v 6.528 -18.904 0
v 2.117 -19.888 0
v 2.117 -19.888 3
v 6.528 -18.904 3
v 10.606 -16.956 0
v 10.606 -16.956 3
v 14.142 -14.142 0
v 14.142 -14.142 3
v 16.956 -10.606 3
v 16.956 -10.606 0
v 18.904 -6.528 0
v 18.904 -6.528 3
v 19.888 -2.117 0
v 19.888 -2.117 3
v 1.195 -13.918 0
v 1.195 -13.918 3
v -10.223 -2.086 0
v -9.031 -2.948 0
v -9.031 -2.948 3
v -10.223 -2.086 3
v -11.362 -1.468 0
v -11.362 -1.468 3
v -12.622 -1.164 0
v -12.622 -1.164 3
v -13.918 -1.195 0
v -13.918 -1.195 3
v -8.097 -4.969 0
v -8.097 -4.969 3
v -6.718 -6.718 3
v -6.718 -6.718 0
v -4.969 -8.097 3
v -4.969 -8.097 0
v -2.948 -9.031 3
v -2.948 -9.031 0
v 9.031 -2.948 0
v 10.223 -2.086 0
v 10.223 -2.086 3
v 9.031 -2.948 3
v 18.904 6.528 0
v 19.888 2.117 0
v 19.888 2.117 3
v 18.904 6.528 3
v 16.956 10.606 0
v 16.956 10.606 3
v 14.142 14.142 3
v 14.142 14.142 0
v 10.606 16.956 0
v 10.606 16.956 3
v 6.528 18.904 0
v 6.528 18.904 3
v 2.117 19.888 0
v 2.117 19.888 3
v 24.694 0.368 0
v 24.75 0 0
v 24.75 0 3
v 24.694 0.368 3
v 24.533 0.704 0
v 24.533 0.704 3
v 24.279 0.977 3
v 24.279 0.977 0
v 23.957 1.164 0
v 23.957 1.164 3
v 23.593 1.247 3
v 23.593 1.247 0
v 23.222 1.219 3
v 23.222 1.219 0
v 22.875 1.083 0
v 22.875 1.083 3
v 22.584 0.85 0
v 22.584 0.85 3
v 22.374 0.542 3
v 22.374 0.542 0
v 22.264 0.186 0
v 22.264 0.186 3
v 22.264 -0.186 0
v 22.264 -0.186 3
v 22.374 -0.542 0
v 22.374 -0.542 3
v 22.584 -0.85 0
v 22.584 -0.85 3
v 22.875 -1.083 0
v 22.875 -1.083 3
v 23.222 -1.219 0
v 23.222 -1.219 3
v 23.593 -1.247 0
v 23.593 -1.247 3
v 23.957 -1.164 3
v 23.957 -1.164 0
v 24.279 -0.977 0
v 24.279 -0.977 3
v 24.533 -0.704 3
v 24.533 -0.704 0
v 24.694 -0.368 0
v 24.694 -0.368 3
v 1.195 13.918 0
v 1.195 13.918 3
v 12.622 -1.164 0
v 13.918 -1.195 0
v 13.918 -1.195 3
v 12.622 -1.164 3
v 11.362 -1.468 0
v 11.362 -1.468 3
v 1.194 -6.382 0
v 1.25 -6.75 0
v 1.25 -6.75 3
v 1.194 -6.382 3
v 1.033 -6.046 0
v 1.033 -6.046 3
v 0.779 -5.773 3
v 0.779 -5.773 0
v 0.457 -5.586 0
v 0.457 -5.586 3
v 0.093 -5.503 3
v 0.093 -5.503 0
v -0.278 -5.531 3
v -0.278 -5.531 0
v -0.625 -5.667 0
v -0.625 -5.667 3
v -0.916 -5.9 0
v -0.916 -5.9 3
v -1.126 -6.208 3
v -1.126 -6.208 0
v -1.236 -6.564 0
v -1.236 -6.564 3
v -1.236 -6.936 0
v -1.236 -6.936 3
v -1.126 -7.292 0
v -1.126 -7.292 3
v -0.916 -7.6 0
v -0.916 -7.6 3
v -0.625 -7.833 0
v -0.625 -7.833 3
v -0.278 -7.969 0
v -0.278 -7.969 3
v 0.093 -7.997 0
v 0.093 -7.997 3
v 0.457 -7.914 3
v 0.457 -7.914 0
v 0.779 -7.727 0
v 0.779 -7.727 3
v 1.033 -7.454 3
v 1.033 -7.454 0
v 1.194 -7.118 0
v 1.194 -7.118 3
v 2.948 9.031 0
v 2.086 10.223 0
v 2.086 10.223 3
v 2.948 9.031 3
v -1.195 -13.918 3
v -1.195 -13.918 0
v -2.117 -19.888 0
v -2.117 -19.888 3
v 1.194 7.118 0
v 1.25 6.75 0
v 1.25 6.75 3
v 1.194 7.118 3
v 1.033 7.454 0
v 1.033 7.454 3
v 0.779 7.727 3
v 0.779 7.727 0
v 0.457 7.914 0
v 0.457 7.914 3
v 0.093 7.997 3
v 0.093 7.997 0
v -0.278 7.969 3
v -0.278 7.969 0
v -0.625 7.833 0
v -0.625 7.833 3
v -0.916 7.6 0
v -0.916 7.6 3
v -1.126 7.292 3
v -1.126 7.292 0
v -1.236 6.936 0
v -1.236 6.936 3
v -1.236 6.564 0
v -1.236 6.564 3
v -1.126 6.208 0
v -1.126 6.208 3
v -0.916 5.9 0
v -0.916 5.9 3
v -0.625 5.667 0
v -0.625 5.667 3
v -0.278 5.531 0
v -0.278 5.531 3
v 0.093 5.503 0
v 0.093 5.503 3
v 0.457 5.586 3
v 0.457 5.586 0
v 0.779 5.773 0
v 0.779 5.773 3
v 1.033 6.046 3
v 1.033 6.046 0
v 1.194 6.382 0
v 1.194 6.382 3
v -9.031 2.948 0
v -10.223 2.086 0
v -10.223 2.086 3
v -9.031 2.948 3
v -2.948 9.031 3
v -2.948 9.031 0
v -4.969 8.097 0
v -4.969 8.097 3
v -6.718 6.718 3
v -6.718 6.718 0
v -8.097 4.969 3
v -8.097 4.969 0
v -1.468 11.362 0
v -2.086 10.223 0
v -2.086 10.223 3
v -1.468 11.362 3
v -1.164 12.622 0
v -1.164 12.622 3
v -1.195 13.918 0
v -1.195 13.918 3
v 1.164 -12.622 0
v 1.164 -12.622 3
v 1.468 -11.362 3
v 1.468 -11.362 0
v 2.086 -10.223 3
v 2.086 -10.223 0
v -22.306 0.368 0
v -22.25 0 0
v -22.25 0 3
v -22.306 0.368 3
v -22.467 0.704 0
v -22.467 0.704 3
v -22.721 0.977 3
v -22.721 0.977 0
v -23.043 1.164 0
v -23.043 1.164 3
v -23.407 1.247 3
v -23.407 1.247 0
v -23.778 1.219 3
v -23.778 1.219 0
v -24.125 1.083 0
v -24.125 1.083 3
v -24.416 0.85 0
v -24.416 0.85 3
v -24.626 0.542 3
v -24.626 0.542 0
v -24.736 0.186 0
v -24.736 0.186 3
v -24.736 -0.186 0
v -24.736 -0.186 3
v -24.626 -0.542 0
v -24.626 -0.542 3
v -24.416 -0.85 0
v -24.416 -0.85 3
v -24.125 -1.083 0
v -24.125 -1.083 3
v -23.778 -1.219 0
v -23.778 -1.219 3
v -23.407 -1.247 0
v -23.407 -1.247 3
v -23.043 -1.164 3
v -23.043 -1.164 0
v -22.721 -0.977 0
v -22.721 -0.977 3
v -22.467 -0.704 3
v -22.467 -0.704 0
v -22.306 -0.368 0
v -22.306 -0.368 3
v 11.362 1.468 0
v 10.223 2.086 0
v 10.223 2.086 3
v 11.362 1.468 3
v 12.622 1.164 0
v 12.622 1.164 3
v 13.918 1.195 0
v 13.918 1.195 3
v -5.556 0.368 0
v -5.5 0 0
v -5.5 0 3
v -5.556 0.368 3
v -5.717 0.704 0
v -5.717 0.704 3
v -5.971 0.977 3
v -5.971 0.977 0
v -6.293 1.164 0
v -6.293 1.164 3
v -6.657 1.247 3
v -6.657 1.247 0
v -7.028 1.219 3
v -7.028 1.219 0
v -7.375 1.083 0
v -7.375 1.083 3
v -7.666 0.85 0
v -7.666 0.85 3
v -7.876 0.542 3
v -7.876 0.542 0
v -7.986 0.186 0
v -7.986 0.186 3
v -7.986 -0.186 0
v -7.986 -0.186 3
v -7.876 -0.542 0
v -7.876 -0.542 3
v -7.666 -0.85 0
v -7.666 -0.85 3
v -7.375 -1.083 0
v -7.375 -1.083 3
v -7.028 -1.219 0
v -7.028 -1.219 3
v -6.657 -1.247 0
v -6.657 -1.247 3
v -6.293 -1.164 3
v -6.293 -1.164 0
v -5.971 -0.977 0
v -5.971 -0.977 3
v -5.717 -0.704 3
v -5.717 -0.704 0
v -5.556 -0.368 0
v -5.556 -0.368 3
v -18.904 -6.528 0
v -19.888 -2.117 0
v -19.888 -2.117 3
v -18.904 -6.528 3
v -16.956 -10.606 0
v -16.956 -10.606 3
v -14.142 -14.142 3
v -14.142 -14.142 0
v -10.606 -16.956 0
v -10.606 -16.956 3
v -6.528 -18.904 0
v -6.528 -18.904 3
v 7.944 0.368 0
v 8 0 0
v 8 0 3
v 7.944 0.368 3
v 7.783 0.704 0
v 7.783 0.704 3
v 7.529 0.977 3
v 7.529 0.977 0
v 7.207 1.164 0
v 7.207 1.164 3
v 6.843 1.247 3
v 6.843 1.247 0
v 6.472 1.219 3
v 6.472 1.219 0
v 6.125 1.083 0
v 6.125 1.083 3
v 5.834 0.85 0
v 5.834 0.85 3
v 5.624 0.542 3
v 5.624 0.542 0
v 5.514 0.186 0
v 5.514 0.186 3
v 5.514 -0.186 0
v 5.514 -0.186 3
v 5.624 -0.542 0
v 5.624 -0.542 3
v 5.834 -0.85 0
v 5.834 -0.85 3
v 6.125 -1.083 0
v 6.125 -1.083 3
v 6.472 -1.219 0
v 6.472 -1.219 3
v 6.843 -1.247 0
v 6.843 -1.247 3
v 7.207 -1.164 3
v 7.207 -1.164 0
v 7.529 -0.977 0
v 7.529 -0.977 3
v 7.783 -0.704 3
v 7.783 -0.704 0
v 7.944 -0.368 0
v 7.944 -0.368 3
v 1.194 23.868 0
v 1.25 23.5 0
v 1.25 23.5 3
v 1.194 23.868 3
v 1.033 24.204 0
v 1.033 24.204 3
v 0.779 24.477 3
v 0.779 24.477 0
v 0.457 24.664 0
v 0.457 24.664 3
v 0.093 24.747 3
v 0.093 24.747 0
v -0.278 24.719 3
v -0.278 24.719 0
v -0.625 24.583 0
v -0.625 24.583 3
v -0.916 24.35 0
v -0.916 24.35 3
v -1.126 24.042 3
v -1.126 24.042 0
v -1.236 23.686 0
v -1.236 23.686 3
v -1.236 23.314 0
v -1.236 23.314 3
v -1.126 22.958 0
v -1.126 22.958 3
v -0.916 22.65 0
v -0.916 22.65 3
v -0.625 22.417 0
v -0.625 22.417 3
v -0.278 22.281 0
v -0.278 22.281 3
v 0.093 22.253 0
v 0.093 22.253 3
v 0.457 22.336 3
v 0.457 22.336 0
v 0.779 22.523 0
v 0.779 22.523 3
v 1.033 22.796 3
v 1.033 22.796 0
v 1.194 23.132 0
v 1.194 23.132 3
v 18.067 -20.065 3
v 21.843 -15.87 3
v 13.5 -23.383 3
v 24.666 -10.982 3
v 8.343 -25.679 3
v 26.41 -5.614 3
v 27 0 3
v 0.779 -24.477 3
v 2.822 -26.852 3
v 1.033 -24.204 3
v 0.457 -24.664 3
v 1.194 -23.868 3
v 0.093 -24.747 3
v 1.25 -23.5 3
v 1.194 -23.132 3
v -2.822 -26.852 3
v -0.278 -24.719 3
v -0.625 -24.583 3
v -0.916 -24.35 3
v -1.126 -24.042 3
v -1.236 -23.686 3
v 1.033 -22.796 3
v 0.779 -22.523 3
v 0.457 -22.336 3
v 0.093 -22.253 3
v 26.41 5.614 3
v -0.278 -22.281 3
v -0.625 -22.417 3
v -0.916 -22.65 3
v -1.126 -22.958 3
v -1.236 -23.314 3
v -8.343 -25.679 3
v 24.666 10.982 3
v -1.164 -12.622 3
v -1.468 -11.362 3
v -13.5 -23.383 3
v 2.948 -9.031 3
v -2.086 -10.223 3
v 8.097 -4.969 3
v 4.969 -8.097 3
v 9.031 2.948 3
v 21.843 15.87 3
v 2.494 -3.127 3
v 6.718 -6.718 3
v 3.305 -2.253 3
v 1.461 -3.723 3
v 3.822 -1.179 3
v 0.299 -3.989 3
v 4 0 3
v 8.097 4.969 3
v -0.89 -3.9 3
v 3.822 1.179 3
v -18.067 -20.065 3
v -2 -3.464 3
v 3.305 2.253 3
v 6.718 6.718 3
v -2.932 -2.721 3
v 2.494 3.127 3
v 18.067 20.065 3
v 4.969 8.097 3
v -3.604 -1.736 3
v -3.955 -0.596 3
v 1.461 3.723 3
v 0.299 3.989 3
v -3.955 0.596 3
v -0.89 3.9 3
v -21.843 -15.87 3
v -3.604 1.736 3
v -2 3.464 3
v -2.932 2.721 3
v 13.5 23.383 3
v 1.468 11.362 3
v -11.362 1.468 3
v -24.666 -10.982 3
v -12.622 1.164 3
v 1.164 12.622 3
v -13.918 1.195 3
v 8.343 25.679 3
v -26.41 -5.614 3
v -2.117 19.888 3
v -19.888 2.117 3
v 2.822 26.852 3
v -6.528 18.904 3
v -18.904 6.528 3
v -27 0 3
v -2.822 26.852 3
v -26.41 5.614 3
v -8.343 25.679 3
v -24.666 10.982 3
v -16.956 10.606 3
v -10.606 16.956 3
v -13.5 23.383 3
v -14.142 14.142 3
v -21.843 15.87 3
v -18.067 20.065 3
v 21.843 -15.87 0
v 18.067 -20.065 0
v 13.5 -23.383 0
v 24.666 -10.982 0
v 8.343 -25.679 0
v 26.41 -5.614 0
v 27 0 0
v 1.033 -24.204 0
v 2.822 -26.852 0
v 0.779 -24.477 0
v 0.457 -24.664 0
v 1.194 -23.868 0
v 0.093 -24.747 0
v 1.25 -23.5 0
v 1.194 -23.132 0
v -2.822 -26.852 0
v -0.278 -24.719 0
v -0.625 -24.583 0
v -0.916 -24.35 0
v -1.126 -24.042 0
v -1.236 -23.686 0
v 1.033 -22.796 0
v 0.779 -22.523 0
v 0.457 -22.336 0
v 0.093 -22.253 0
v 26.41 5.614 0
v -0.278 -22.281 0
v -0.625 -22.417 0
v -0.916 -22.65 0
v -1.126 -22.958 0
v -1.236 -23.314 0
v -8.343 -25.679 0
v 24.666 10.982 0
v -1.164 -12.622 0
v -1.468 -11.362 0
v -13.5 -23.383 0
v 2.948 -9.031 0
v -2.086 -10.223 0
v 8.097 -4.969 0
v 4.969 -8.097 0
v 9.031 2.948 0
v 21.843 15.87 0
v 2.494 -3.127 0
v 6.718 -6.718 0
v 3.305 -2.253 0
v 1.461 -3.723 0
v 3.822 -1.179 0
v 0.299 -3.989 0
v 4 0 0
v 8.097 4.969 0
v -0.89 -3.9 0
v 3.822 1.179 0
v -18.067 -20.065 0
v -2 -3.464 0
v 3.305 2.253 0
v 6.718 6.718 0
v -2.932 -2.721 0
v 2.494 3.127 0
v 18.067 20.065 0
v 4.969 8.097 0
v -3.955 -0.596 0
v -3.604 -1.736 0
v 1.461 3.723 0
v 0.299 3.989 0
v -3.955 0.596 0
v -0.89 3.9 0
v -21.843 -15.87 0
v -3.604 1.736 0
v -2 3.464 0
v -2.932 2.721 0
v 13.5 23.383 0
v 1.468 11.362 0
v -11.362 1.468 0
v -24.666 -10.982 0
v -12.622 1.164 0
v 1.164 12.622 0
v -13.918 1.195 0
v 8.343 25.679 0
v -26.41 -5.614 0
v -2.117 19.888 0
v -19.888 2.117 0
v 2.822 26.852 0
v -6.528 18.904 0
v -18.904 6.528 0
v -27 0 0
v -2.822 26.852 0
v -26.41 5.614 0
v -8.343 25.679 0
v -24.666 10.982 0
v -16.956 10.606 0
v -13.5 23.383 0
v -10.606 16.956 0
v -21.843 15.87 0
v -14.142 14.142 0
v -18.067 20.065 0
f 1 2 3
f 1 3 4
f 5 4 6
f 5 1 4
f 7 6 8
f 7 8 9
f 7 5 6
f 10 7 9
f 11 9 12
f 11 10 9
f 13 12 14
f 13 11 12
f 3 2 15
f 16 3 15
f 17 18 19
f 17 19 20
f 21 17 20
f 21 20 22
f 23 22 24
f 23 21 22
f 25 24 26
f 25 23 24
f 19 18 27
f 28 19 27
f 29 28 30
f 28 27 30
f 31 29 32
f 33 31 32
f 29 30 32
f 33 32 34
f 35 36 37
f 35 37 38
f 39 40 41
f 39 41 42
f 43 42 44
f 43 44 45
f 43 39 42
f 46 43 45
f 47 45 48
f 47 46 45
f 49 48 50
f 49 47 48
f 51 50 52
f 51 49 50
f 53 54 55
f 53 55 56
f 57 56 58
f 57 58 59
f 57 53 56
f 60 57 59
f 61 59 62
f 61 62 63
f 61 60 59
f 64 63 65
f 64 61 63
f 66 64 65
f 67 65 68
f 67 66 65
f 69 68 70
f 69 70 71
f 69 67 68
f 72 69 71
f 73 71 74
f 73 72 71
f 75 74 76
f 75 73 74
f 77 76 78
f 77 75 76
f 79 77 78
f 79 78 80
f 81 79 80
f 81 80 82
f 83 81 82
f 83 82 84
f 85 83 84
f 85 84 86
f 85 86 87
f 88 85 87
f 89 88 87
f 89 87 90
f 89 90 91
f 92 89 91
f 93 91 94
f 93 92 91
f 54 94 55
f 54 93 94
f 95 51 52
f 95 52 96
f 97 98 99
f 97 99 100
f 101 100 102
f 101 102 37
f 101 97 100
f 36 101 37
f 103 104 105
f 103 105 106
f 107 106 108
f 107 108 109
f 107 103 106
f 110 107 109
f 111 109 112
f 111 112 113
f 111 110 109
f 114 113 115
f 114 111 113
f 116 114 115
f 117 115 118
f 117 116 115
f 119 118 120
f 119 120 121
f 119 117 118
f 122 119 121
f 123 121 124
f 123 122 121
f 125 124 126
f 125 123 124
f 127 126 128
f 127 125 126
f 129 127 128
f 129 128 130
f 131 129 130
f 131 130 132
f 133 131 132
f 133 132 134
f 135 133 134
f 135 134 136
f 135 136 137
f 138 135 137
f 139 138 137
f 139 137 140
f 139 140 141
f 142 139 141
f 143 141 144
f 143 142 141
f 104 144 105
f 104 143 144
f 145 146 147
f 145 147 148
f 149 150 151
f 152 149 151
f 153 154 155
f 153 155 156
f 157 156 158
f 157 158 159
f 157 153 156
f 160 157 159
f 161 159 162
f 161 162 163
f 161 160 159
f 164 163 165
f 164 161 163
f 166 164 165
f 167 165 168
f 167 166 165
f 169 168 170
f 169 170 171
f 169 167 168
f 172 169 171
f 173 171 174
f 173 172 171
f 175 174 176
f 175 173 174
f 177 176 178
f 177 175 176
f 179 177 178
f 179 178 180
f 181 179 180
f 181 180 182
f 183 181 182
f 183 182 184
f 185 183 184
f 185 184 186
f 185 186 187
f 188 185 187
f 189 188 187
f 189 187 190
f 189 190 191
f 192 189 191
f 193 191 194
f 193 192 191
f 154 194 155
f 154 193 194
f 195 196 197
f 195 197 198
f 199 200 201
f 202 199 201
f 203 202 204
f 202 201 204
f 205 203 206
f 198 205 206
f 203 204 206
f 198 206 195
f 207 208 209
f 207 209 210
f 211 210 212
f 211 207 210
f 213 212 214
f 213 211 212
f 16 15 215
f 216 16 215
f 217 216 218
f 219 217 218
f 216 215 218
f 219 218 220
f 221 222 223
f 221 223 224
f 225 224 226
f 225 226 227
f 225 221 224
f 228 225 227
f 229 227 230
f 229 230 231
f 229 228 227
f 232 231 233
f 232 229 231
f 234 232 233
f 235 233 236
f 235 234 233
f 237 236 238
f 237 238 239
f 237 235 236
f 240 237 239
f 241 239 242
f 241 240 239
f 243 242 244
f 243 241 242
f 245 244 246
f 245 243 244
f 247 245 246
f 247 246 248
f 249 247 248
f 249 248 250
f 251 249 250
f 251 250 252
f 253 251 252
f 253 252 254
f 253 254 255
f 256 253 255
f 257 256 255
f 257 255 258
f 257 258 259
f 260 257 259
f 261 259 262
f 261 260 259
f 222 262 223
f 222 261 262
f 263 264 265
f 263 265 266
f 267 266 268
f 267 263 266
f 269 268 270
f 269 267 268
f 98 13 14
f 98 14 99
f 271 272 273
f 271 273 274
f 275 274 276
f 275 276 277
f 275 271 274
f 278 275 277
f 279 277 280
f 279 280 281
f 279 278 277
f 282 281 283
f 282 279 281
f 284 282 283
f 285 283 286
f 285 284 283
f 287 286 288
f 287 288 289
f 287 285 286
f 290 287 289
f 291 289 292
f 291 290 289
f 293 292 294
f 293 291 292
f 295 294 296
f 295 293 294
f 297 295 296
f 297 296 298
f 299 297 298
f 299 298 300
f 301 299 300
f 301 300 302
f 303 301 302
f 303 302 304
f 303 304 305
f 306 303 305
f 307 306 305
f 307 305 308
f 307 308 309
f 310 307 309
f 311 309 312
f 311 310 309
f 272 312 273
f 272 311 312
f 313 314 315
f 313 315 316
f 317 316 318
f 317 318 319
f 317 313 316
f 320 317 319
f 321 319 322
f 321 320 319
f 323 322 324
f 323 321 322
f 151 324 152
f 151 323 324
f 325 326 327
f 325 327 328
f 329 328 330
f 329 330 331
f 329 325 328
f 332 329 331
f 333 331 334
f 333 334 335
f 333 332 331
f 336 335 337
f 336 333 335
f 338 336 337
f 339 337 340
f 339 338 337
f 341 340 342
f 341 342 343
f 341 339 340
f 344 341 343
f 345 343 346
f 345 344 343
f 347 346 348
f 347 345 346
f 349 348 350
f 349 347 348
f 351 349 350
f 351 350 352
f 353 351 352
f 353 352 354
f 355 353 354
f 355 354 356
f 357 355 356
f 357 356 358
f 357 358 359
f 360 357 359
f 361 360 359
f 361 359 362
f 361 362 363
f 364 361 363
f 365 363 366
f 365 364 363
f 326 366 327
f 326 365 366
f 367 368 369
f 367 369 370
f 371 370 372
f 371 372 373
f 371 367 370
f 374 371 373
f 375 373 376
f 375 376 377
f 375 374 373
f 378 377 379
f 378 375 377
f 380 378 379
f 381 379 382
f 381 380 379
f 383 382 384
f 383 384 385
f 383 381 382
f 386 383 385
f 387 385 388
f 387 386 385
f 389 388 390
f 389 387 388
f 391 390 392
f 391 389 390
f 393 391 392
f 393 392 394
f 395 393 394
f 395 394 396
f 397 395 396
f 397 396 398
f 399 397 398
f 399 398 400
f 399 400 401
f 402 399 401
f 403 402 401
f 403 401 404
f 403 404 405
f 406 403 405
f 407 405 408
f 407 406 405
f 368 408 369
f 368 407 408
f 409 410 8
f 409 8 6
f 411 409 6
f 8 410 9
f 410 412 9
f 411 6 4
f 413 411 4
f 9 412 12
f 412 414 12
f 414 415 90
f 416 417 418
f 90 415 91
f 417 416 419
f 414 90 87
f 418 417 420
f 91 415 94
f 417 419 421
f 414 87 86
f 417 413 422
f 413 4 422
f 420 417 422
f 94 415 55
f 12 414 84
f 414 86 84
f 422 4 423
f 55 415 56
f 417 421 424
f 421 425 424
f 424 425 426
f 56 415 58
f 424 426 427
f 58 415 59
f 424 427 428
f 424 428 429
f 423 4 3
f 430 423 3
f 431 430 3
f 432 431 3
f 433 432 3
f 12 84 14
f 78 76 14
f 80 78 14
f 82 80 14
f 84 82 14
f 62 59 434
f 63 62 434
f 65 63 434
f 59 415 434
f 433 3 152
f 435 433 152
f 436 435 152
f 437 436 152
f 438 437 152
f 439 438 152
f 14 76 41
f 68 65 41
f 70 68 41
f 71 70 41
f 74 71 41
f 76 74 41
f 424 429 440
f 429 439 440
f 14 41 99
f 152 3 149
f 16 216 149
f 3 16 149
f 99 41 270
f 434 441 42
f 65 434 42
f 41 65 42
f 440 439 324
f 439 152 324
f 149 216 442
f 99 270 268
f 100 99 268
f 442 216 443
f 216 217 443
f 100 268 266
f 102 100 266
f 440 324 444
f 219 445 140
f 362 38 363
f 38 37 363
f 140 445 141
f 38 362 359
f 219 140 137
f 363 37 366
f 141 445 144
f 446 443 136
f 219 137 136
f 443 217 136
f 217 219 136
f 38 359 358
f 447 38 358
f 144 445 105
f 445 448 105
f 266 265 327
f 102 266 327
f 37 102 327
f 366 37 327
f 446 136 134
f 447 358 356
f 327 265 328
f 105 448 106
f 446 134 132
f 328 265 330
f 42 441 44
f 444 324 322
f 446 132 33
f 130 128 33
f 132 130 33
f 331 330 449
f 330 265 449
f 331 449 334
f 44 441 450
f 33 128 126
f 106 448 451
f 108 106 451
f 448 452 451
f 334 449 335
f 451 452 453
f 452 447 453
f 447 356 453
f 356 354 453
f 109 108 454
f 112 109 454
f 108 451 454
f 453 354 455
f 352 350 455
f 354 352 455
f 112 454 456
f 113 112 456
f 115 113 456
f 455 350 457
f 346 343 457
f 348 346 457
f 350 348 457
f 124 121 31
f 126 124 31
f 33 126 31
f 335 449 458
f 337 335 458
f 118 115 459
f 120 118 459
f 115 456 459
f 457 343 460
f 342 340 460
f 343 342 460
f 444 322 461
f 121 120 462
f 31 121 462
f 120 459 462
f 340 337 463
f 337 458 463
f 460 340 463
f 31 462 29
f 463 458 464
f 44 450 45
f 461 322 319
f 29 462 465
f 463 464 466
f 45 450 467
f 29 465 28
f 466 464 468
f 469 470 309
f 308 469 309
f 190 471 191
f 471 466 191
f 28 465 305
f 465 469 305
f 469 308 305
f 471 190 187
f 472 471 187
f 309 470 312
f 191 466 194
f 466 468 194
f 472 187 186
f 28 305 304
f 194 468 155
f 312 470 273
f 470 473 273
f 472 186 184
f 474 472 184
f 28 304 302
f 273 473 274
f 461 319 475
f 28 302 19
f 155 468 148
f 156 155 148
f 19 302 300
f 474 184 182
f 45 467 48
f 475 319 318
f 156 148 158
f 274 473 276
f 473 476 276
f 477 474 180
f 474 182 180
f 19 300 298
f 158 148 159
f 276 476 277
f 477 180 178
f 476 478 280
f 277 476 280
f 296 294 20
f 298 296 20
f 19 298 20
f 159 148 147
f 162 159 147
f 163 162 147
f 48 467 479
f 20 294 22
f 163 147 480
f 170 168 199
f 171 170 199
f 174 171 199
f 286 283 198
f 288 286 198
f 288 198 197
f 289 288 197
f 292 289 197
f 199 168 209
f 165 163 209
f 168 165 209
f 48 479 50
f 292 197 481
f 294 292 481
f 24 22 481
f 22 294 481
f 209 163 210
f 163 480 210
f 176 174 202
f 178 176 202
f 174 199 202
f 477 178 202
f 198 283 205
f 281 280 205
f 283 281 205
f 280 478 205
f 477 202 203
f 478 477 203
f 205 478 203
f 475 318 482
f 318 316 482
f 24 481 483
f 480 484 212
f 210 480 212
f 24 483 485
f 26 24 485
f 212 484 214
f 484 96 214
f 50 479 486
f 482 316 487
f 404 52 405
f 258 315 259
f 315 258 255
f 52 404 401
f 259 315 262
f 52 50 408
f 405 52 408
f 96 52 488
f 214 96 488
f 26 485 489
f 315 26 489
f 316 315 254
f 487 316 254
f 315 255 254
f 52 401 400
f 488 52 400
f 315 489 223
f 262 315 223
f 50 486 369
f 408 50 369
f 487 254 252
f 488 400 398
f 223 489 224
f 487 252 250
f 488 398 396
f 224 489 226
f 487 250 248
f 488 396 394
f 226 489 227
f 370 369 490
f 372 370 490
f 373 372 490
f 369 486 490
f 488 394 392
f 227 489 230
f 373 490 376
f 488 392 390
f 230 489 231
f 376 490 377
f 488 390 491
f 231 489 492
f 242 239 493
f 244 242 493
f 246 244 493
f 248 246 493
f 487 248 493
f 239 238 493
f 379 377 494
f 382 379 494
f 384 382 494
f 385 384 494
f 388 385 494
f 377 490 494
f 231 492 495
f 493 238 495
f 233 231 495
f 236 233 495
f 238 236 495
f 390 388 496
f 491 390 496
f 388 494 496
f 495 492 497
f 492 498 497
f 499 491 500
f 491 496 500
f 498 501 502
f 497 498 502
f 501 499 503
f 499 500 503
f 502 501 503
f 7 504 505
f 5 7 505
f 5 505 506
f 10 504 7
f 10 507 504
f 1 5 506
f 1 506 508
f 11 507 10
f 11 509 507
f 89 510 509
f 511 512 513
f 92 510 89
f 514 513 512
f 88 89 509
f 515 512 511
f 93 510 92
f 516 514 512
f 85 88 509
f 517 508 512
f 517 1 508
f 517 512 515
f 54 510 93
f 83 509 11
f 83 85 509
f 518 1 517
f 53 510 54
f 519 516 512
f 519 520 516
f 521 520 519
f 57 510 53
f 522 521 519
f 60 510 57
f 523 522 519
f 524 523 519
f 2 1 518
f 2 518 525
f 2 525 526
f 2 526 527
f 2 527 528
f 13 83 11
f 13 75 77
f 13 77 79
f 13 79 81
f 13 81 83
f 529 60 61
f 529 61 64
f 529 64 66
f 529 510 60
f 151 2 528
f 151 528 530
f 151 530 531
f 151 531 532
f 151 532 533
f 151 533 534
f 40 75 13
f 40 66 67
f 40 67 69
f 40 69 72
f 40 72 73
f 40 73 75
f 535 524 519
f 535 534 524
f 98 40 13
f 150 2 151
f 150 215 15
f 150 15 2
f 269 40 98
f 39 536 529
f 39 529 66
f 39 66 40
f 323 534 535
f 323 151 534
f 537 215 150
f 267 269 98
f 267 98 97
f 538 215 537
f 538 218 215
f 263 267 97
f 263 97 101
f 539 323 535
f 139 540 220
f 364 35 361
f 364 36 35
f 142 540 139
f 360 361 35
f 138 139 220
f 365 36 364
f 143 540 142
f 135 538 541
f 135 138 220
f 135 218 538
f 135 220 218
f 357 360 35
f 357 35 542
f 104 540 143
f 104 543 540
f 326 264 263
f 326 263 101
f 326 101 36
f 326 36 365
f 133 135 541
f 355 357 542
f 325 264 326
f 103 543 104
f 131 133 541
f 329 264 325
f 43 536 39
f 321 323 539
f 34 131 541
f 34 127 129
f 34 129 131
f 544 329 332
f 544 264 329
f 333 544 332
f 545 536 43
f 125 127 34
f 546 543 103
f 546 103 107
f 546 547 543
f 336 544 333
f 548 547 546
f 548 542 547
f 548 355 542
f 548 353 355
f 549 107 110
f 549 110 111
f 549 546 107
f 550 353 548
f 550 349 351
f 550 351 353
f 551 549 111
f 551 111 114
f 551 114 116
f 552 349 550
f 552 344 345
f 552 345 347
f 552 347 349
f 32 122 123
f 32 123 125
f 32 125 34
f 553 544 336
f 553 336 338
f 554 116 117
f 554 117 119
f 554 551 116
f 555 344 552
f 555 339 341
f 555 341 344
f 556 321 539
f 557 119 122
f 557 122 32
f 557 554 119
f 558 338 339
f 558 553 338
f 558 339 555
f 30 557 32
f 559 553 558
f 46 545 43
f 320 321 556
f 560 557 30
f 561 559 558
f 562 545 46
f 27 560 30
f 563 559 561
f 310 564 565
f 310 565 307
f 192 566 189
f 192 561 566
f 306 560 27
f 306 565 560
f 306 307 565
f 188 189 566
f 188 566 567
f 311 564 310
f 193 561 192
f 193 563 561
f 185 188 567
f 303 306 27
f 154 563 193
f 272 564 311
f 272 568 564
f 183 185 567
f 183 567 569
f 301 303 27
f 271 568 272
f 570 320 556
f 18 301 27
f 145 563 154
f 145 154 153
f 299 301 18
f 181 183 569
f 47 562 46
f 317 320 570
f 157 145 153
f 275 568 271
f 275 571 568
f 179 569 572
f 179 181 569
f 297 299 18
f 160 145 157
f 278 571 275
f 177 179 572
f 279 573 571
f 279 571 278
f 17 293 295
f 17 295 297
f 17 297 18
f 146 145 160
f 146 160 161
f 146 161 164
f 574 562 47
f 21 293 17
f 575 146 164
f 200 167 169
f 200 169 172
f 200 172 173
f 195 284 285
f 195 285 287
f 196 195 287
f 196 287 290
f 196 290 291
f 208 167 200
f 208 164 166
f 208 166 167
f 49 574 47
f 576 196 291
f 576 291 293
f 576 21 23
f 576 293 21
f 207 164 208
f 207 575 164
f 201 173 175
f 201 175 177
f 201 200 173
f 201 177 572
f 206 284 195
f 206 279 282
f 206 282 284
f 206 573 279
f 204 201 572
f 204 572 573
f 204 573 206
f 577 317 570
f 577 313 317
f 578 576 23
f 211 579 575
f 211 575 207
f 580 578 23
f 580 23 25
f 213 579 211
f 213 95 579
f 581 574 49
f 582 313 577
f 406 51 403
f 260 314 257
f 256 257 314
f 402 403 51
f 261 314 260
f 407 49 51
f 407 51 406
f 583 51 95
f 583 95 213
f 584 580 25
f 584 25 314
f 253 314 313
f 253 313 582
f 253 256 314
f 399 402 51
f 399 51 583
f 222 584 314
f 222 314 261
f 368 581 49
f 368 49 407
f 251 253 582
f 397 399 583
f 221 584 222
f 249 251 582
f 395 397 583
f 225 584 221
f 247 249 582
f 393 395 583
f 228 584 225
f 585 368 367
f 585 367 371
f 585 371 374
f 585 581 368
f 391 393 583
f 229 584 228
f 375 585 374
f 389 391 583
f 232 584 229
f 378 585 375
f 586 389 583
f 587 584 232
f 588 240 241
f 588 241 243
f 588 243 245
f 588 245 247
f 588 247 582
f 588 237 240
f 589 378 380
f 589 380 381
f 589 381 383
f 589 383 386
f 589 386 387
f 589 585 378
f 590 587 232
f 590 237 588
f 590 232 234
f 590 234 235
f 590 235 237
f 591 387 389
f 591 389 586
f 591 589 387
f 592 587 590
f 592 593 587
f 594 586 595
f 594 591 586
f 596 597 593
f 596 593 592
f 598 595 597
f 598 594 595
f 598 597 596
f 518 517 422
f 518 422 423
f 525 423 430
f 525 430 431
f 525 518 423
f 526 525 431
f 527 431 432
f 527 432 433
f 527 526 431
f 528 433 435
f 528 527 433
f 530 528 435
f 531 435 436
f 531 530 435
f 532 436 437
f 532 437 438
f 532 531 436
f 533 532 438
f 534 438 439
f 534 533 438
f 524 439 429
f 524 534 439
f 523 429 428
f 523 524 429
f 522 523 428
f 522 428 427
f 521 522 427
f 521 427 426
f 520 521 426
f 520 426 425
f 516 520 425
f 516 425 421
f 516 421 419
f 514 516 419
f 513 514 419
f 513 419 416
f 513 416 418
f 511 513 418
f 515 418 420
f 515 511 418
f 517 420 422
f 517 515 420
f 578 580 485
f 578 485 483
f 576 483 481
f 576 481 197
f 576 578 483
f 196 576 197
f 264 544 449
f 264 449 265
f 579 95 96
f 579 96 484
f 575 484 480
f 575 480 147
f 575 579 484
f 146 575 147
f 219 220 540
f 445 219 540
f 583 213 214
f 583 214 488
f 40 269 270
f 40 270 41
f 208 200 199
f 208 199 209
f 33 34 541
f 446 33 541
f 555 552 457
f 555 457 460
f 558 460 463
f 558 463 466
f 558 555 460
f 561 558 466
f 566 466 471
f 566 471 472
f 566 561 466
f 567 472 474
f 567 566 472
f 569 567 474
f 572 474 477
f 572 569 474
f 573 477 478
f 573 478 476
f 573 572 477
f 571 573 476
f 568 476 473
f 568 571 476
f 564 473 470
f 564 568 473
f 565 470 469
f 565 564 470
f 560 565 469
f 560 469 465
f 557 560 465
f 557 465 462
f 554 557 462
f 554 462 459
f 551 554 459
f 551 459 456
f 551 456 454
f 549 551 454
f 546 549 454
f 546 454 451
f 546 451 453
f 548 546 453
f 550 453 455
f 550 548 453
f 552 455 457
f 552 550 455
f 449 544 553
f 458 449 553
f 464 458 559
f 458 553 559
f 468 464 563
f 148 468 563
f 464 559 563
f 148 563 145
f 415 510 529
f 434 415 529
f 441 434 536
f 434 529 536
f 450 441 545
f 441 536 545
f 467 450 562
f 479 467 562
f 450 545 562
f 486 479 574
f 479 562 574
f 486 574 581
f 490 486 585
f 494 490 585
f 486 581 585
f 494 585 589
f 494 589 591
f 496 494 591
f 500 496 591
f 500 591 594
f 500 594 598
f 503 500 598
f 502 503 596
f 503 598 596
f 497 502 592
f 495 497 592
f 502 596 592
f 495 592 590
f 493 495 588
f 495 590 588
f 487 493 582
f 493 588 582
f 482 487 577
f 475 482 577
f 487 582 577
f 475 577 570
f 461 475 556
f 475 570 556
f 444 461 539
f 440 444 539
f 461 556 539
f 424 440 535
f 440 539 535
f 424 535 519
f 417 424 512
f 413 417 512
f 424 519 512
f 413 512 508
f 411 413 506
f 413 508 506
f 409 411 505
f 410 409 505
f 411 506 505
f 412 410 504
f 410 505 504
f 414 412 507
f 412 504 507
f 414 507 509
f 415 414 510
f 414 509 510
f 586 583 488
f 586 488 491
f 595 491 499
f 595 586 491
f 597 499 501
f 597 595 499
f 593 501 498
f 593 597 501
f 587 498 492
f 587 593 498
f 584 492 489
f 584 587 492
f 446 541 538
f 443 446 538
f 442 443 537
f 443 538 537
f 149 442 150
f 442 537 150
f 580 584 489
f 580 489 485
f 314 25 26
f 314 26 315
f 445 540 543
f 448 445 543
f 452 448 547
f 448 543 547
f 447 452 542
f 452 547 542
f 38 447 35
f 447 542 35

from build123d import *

# Parameters (mm, degrees)
SKETCH1_R             = 27
SKETCH1_R_2           = 1.25
SKETCH1_R_3           = 20
BOSS_EXTRUDE1_DEPTH   = 3
SKETCH1_R_4           = 9.5
SKETCH1_R_5           = 4
BOSS_EXTRUDE1_2_DEPTH = 3
BOSS_EXTRUDE2_DEPTH   = 3


with BuildPart() as part:
    # Sketch1 → Boss-Extrude1 (new body)
    with BuildSketch(Plane.XY):
        Circle(SKETCH1_R)
        with Locations((23.5, 0)):
            Circle(SKETCH1_R_2, mode=Mode.SUBTRACT)
        with Locations((0, -23.5)):
            Circle(SKETCH1_R_2, mode=Mode.SUBTRACT)
        with Locations((-23.5, 0)):
            Circle(SKETCH1_R_2, mode=Mode.SUBTRACT)
        with Locations((0, 23.5)):
            Circle(SKETCH1_R_2, mode=Mode.SUBTRACT)
        Circle(SKETCH1_R_3, mode=Mode.SUBTRACT)
    extrude(amount=BOSS_EXTRUDE1_DEPTH)



with BuildPart() as body_2:
    # Sketch1 → Boss-Extrude1 2 (new body)
    with BuildSketch(Plane.XY):
        Circle(SKETCH1_R_4)
        with Locations((6.75, 0)):
            Circle(SKETCH1_R_2, mode=Mode.SUBTRACT)
        with Locations((0, -6.75)):
            Circle(SKETCH1_R_2, mode=Mode.SUBTRACT)
        with Locations((-6.75, 0)):
            Circle(SKETCH1_R_2, mode=Mode.SUBTRACT)
        with Locations((0, 6.75)):
            Circle(SKETCH1_R_2, mode=Mode.SUBTRACT)
        Circle(SKETCH1_R_5, mode=Mode.SUBTRACT)
    extrude(amount=BOSS_EXTRUDE1_2_DEPTH)


with BuildPart() as part_1:
    add(part.part)

    add(body_2.part)  # Boss-Extrude2 merges body 2
    # Sketch2 → Boss-Extrude2 (add)
    with BuildSketch(Plane.XY):
        with BuildLine():
            ThreePointArc((-13.918195932, 1.194775158), (-11.982498043, 1.275378496), (-10.222750069, 2.085755129))
            Line((-10.222750069, 2.085755129), (-9.030872227, 2.948448204))
            Line((-9.030872227, 2.948448204), (-9.030872227, -2.948448204))
            Line((-9.030872227, -2.948448204), (-10.222750069, -2.085755129))
            ThreePointArc((-10.222750069, -2.085755129), (-11.982498043, -1.275378496), (-13.918195932, -1.194775158))
            Line((-13.918195932, -1.194775158), (-19.887594178, -2.117450782))
            Line((-19.887594178, -2.117450782), (-20.214883486, 0))
            Line((-20.214883486, 0), (-19.887594178, 2.117450782))
            Line((-19.887594178, 2.117450782), (-13.918195932, 1.194775158))
        make_face()
        with BuildLine():
            Line((0, 20.214883486), (2.117450782, 19.887594178))
            Line((2.117450782, 19.887594178), (1.194775158, 13.918195932))
            ThreePointArc((1.194775158, 13.918195932), (1.275378496, 11.982498043), (2.085755129, 10.222750069))
            Line((2.085755129, 10.222750069), (2.948448204, 9.030872227))
            Line((2.948448204, 9.030872227), (-2.948448204, 9.030872227))
            Line((-2.948448204, 9.030872227), (-2.085755129, 10.222750069))
            ThreePointArc((-2.085755129, 10.222750069), (-1.275378496, 11.982498043), (-1.194775158, 13.918195932))
            Line((-1.194775158, 13.918195932), (-2.117450782, 19.887594178))
            Line((-2.117450782, 19.887594178), (0, 20.214883486))
        make_face()
        with BuildLine():
            Line((19.887594178, -2.117450782), (13.918195932, -1.194775158))
            ThreePointArc((13.918195932, -1.194775158), (11.982498043, -1.275378496), (10.222750069, -2.085755129))
            Line((10.222750069, -2.085755129), (9.030872227, -2.948448204))
            Line((9.030872227, -2.948448204), (9.030872227, 2.948448204))
            Line((9.030872227, 2.948448204), (10.222750069, 2.085755129))
            ThreePointArc((10.222750069, 2.085755129), (11.982498043, 1.275378496), (13.918195932, 1.194775158))
            Line((13.918195932, 1.194775158), (19.887594178, 2.117450782))
            Line((19.887594178, 2.117450782), (20.214883486, 0))
            Line((20.214883486, 0), (19.887594178, -2.117450782))
        make_face()
        with BuildLine():
            Line((2.117450782, -19.887594178), (1.194775158, -13.918195932))
            ThreePointArc((1.194775158, -13.918195932), (1.275378496, -11.982498043), (2.085755129, -10.222750069))
            Line((2.085755129, -10.222750069), (2.948448204, -9.030872227))
            Line((2.948448204, -9.030872227), (-2.948448204, -9.030872227))
            Line((-2.948448204, -9.030872227), (-2.085755129, -10.222750069))
            ThreePointArc((-2.085755129, -10.222750069), (-1.275378496, -11.982498043), (-1.194775158, -13.918195932))
            Line((-1.194775158, -13.918195932), (-2.117450782, -19.887594178))
            Line((-2.117450782, -19.887594178), (0, -20.214883486))
            Line((0, -20.214883486), (2.117450782, -19.887594178))
        make_face()
    extrude(amount=BOSS_EXTRUDE2_DEPTH)


solid = part_1.part
